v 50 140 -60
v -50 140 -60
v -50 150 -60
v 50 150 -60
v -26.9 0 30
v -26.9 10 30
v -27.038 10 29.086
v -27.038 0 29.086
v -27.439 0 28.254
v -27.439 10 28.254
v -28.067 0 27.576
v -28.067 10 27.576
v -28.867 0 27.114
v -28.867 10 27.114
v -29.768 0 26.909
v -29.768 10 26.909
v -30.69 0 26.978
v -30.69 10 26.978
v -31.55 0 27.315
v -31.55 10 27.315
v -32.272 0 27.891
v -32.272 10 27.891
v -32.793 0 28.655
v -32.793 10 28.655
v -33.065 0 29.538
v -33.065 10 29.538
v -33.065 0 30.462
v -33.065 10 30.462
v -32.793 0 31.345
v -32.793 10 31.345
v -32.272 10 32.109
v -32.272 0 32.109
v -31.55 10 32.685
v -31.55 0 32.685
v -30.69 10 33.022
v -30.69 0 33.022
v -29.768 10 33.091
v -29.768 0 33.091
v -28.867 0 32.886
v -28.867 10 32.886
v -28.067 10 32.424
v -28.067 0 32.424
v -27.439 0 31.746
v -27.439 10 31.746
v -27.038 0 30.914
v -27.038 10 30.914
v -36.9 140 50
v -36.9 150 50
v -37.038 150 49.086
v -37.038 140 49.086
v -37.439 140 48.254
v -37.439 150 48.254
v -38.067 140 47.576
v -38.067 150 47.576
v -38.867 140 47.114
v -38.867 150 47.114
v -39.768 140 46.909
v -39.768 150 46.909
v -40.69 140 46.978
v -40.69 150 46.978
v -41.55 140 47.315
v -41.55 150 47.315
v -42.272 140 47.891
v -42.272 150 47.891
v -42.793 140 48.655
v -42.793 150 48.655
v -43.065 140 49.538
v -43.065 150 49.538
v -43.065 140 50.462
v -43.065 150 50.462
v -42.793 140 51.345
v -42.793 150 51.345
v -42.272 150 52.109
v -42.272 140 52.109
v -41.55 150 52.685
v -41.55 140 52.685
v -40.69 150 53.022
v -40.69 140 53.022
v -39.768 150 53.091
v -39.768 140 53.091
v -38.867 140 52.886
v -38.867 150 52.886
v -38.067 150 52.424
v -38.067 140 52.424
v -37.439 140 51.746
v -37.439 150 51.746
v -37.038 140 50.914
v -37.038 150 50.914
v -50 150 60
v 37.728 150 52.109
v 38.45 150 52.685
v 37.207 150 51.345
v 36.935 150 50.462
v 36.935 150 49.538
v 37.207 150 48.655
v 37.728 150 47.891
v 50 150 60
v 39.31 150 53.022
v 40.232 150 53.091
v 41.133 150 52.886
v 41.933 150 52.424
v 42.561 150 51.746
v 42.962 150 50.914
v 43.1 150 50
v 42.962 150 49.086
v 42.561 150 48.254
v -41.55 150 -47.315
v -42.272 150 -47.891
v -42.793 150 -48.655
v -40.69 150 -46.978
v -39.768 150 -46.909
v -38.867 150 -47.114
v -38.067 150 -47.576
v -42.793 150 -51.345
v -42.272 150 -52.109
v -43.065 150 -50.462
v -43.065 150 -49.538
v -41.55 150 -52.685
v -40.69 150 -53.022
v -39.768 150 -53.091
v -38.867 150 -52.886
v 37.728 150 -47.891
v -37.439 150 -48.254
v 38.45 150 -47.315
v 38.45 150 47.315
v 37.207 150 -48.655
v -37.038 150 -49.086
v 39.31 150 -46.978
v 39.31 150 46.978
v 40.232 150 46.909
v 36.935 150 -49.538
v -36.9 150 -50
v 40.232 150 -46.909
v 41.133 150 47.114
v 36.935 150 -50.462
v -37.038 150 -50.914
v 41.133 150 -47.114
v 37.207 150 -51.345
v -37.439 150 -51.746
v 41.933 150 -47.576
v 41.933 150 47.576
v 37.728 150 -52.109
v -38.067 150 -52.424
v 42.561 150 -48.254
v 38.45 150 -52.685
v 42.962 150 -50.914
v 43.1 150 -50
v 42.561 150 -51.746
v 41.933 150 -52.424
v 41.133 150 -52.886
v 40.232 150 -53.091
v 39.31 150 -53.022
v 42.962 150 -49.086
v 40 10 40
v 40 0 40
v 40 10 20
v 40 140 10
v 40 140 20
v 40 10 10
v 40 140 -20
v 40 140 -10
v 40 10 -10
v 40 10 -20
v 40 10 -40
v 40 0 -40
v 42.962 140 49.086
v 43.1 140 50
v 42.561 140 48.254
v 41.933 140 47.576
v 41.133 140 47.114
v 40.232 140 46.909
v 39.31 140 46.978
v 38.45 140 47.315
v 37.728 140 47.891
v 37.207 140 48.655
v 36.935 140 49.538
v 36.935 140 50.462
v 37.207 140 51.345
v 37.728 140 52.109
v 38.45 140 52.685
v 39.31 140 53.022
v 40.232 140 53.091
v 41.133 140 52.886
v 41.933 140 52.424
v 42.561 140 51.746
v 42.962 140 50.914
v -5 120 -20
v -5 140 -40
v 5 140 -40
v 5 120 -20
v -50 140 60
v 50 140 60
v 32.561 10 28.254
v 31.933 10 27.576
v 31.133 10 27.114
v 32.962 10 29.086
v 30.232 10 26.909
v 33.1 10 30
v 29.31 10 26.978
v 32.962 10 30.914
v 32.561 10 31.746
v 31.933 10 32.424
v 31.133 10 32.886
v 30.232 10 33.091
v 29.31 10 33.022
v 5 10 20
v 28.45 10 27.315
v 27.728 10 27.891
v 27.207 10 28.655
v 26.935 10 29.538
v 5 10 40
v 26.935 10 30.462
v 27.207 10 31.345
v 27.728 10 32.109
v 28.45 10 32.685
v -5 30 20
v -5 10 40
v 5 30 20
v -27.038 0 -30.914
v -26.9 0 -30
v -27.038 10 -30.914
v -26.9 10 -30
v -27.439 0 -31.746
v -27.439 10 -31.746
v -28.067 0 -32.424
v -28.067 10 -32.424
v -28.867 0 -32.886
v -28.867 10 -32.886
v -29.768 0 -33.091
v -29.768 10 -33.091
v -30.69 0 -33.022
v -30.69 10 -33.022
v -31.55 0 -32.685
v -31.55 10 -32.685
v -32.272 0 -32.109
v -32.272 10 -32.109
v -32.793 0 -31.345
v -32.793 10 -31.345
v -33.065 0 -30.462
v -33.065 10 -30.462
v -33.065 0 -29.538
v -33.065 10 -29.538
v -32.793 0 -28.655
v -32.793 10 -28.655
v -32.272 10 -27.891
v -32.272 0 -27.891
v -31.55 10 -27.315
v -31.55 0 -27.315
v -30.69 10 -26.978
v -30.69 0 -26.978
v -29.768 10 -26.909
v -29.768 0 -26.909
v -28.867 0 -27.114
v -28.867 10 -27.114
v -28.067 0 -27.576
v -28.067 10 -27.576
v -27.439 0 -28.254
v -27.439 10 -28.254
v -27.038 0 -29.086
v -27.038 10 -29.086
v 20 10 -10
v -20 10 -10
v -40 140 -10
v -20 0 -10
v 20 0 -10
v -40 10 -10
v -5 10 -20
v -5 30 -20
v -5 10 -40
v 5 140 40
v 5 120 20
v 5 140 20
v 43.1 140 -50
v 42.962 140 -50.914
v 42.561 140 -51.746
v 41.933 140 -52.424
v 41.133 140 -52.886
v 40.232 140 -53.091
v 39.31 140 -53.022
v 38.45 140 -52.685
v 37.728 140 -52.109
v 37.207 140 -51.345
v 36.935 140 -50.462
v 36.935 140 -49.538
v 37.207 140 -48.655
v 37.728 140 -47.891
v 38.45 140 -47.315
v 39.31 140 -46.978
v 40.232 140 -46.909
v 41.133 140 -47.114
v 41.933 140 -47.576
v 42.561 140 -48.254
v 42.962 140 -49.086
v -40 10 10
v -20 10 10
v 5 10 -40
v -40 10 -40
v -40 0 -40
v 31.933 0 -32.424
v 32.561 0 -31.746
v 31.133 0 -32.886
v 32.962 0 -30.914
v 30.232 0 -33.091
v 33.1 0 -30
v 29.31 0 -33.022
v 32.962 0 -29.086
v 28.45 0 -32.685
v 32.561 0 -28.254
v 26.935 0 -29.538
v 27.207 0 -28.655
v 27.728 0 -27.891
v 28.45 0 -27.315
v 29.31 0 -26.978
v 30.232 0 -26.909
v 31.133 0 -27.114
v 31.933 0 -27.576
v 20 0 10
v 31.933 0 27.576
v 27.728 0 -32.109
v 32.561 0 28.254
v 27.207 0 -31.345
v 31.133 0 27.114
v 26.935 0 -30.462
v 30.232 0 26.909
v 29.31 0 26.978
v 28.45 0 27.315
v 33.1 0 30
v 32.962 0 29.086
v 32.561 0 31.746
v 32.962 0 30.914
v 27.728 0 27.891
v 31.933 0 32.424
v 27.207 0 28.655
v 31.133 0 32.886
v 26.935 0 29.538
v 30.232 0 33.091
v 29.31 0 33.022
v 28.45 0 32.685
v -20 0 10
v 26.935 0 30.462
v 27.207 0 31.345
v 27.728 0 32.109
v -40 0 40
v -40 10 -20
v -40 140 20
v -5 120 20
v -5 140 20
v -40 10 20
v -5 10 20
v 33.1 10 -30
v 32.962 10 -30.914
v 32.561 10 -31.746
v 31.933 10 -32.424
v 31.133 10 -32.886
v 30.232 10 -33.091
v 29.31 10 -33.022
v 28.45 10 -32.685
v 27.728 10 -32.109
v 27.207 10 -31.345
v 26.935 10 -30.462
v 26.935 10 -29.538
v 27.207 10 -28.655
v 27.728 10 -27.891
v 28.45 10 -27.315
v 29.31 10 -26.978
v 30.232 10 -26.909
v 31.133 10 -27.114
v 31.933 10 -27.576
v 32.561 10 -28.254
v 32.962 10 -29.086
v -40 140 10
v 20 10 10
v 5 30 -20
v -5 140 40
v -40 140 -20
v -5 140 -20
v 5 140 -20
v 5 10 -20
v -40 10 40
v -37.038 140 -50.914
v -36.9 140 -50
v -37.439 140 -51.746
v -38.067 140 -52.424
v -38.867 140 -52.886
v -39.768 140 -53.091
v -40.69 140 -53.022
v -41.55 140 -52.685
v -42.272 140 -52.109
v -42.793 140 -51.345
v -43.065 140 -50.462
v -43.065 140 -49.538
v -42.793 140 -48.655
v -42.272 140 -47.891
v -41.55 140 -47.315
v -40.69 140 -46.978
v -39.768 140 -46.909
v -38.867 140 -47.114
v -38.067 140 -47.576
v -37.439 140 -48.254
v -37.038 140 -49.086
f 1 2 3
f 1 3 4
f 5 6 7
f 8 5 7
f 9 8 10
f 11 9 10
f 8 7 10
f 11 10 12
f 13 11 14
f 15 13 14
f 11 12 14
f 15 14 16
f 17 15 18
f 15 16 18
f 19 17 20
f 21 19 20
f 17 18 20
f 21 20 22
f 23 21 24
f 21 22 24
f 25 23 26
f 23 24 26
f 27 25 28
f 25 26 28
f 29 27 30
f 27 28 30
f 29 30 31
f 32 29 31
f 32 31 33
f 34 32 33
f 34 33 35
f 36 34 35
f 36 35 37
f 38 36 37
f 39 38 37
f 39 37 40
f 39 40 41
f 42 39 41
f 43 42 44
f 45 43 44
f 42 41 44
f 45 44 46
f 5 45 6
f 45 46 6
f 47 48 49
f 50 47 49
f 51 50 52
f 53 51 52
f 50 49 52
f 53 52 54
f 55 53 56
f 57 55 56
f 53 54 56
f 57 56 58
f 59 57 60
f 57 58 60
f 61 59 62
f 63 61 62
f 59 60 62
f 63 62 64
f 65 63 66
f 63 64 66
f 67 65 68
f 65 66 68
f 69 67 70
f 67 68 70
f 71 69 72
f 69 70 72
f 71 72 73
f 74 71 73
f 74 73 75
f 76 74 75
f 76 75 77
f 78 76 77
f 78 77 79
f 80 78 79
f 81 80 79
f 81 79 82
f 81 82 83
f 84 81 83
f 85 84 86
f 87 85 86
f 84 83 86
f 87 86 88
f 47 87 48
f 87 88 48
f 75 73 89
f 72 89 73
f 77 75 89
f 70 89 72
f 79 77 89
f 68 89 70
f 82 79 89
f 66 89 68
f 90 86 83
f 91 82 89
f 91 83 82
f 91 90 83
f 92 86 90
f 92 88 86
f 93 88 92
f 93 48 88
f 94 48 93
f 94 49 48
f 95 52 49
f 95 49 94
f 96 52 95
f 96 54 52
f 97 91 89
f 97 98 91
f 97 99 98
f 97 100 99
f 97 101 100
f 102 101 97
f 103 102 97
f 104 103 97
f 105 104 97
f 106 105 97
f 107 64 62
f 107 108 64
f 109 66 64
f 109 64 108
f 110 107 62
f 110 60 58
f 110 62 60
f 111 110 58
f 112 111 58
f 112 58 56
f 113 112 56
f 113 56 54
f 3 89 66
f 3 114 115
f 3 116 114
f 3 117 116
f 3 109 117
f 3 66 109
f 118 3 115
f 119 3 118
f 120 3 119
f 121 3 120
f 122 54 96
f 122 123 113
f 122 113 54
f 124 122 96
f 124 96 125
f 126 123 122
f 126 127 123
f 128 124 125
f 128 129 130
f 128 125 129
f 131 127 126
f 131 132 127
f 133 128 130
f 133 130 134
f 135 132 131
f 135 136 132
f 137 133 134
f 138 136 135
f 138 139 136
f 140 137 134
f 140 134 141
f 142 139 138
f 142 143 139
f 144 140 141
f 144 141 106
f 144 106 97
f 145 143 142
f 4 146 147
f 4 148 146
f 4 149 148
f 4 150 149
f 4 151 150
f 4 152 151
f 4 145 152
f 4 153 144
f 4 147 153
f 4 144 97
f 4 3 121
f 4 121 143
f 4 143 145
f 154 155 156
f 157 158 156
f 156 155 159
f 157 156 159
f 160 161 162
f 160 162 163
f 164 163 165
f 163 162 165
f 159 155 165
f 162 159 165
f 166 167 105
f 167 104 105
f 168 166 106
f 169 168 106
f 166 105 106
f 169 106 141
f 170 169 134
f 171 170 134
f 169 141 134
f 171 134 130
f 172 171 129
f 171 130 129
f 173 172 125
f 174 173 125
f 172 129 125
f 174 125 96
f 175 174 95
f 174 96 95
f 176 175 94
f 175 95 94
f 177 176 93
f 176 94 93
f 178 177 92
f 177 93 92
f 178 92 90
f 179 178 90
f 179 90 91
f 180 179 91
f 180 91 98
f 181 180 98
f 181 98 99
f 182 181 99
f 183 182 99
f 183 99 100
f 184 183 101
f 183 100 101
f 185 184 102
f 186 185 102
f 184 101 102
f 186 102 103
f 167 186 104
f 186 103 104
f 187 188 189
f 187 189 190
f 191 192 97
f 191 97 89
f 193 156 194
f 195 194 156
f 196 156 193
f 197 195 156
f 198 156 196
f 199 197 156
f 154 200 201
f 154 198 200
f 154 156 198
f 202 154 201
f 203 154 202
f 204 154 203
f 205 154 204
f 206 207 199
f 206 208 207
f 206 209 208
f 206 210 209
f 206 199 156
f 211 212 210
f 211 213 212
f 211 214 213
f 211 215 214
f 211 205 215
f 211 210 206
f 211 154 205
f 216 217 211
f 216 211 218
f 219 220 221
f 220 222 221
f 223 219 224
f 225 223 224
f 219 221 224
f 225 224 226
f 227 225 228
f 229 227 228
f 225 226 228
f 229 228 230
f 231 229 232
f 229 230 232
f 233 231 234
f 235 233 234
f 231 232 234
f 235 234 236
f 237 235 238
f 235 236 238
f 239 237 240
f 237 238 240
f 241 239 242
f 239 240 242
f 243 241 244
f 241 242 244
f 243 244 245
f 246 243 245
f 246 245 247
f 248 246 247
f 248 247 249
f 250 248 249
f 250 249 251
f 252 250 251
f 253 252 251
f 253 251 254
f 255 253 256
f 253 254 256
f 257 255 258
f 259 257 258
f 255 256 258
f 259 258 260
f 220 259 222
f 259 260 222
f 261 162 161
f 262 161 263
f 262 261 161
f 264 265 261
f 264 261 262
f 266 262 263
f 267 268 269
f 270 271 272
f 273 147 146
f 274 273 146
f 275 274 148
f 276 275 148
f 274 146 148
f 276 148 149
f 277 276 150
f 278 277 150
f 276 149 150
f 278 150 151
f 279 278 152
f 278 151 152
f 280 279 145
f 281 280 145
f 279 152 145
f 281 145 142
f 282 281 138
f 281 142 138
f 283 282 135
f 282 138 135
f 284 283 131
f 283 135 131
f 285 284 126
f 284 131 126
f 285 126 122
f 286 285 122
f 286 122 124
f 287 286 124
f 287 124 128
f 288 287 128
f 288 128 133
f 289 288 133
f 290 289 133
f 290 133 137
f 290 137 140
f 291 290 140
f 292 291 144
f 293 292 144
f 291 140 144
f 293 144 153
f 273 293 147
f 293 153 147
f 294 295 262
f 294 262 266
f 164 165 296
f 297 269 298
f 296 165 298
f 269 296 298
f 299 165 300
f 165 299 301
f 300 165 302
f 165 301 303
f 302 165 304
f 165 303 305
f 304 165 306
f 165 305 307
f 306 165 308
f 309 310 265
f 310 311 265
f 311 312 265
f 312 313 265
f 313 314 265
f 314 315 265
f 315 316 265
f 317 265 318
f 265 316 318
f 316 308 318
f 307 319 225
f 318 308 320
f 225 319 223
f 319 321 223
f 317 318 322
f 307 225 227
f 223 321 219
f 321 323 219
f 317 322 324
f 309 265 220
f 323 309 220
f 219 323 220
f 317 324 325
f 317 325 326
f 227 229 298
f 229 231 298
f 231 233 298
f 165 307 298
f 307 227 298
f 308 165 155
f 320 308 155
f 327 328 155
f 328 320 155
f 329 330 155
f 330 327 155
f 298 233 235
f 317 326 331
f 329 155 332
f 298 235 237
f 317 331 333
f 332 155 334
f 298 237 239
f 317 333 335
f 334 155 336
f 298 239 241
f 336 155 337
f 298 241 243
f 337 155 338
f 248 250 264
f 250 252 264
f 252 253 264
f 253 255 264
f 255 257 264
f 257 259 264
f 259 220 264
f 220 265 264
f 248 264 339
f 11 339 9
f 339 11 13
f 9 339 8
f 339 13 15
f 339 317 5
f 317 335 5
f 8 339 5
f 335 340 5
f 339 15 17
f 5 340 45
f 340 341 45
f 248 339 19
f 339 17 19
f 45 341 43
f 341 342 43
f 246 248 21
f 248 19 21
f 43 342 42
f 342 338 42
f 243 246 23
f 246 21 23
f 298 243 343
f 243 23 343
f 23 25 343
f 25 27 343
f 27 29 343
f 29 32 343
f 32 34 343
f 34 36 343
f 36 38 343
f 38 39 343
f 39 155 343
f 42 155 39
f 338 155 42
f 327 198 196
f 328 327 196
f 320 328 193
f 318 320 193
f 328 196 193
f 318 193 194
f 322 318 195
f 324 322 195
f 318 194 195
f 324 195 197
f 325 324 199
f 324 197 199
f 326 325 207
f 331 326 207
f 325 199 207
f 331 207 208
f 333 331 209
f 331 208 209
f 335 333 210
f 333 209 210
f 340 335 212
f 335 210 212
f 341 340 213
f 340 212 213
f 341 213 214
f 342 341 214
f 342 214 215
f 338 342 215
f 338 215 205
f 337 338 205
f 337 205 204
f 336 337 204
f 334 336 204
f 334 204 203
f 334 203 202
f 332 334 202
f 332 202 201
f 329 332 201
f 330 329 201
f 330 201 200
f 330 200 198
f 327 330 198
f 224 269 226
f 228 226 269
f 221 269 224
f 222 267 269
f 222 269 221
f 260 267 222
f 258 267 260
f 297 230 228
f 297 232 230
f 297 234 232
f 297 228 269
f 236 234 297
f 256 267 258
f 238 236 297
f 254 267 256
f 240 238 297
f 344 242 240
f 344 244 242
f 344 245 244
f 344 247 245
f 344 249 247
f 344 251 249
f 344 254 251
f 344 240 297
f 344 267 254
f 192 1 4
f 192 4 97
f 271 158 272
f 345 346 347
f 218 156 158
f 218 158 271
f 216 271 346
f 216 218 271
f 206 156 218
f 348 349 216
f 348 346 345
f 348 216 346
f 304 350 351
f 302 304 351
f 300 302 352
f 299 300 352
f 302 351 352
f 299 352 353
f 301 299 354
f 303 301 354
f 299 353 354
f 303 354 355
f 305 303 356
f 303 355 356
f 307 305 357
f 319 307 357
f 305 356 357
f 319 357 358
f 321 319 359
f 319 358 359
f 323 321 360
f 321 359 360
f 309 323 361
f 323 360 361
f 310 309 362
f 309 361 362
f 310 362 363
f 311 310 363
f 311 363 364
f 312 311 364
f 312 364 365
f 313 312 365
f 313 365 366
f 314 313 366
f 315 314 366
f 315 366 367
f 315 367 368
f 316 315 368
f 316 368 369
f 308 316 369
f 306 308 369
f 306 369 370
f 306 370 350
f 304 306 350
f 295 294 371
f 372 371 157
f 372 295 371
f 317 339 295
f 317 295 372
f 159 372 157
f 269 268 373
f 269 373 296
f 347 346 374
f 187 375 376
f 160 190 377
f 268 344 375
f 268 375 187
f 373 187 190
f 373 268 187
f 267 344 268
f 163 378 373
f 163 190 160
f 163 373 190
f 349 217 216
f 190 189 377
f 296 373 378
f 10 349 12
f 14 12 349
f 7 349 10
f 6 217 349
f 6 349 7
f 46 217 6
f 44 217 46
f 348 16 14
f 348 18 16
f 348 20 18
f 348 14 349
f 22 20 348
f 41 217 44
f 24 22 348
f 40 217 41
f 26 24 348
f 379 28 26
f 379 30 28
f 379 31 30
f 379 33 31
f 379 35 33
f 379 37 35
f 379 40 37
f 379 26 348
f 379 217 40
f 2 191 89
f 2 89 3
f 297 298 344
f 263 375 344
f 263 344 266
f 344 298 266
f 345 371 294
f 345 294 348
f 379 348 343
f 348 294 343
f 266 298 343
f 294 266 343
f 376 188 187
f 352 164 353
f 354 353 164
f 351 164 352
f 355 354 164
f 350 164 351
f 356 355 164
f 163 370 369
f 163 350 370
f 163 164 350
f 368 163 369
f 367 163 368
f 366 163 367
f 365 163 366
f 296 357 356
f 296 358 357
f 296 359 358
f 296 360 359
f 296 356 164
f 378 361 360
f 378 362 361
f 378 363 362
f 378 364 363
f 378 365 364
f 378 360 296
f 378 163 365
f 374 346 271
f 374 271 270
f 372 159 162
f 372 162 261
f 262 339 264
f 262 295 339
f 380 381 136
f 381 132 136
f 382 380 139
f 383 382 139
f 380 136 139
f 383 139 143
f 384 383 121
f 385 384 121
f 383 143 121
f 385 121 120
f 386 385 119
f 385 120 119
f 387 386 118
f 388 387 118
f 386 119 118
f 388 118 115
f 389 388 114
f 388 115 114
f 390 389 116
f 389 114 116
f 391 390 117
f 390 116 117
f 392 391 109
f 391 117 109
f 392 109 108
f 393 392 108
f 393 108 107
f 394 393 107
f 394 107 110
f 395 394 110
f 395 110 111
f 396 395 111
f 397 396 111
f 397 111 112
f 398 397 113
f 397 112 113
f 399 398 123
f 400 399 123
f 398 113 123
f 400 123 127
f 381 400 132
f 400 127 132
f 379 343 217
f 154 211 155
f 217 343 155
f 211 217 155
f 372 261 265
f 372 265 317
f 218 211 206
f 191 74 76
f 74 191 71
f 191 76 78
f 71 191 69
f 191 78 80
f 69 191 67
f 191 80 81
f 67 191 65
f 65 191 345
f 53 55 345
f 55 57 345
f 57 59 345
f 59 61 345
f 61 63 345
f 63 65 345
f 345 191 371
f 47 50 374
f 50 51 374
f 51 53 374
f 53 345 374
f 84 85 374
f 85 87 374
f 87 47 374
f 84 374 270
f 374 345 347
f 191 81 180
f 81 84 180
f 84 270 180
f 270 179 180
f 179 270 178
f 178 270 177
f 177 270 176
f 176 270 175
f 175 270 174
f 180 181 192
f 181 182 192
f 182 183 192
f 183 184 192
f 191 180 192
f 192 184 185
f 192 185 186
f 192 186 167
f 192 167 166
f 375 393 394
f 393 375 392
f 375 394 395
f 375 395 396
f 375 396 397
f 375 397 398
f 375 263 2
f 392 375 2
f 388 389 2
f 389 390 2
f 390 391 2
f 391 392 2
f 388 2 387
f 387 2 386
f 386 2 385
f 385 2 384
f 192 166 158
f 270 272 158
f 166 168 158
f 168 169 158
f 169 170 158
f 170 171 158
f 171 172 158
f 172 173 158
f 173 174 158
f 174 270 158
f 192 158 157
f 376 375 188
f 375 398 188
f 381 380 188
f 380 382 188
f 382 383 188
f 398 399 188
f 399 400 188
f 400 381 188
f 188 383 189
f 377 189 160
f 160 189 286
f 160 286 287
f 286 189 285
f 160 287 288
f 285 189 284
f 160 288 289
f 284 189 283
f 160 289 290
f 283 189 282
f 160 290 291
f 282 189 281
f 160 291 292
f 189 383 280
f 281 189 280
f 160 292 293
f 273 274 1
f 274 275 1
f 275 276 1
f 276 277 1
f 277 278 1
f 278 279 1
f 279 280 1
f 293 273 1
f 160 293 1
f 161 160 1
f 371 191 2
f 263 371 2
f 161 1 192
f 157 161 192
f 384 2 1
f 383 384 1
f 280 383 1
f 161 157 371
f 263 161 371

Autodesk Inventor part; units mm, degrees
sketch "Sketch1" plane through (0, 0, 0) normal (0, 1, 0) x (-1, 0, 0)
  line L0 (40, 40) -> (-40, 40)
  line L1 (-40, 40) -> (-40, -40)
  line L2 (-40, -40) -> (40, -40)
  line L3 (40, -40) -> (40, 40)
  line L4 (40, 40) -> (-40, -40) construction
  line L5 (-40, 40) -> (40, -40) construction
  point P0 (0, 0)
  dimension "d0" = 80
  dimension "d1" = 80
extrude "Extrusion1" add sketch "Sketch1" along normal blind 10
sketch "Sketch2" plane through (0, 10, 0) normal (0, 1, 0) x (1, 0, 0)
  circle A0 centre (30, 30) radius 3.1
  circle A1 centre (30, -30) radius 3.1
  circle A2 centre (-30, -30) radius 3.1
  circle A3 centre (-30, 30) radius 3.1
  point P0 (0, 0)
  dimension "d4" = 6.2
  dimension "d5" = 6.2
  dimension "d6" = 6.2
  dimension "d7" = 6.2
  dimension "d8" = 30
  dimension "d9" = 30
  dimension "d10" = 30
  dimension "d11" = 30
  dimension "d12" = 30
  dimension "d13" = 30
  dimension "d14" = 30
  dimension "d15" = 30
extrude "Extrusion2" cut sketch "Sketch2" against normal blind 10
sketch "Sketch3" plane through (0, 10, 0) normal (0, 1, 0) x (1, 0, 0)
  line L0 (40, 10) -> (-40, 10)
  line L1 (-40, 10) -> (-40, 20)
  line L2 (-40, 20) -> (40, 20)
  line L3 (40, 20) -> (40, 10)
  line L4 (40, 10) -> (-40, 20) construction
  line L5 (-40, 10) -> (40, 20) construction
  line L6 (40, -20) -> (-40, -20)
  line L7 (-40, -20) -> (-40, -10)
  line L8 (-40, -10) -> (40, -10)
  line L9 (40, -10) -> (40, -20)
  line L10 (40, -20) -> (-40, -10) construction
  line L11 (-40, -20) -> (40, -10) construction
  line L12 (-40, 40) -> (-40, -40) projected
  line L13 (40, -40) -> (40, 40) projected
  line L14 (40, 40) -> (-40, 40) projected
  line L15 (-40, -40) -> (40, -40) projected
  point P0 (0, 0)
  point P1 (0, 15)
  point P2 (0, -15)
  dimension "d19" = 10
  dimension "d20" = 10
  dimension "d21" = 20
  dimension "d22" = 20
extrude "Extrusion3" add sketch "Sketch3" along normal blind 130 contours L0 L1 L2 L3 | L9 L6 L7 L8
sketch "Sketch4" plane through (0, 10, 0) normal (0, 1, 0) x (1, 0, 0)
  line L0 (20, -10) -> (-20, -10)
  line L1 (-20, -10) -> (-20, 10)
  line L2 (-20, 10) -> (20, 10)
  line L3 (20, 10) -> (20, -10)
  line L4 (20, -10) -> (-20, 10) construction
  line L5 (-20, -10) -> (20, 10) construction
  line L6 (-40, 10) -> (40, 10) projected
  point P0 (0, 0)
  dimension "d25" = 40
extrude "Extrusion4" cut sketch "Sketch4" against normal blind 10
sketch "Sketch5" plane through (0, 140, 0) normal (0, 1, 0) x (1, 0, 0)
  line L0 (50, -60) -> (-50, -60)
  line L1 (-50, -60) -> (-50, 60)
  line L2 (-50, 60) -> (50, 60)
  line L3 (50, 60) -> (50, -60)
  line L4 (50, -60) -> (-50, 60) construction
  line L5 (-50, -60) -> (50, 60) construction
  point P0 (0, 0)
  dimension "d28" = 100
  dimension "d29" = 120
extrude "Extrusion5" add sketch "Sketch5" along normal blind 10
sketch "Sketch6" plane through (0, 150, 0) normal (0, 1, 0) x (1, 0, 0)
  circle A0 centre (-40, 50) radius 3.1
  circle A1 centre (40, 50) radius 3.1
  circle A2 centre (40, -50) radius 3.1
  circle A3 centre (-40, -50) radius 3.1
  point P0 (0, 0)
  dimension "d32" = 6.2
  dimension "d33" = 6.2
  dimension "d34" = 6.2
  dimension "d35" = 6.2
  dimension "d36" = 50
  dimension "d37" = 50
  dimension "d38" = 50
  dimension "d39" = 50
  dimension "d40" = 40
  dimension "d41" = 40
  dimension "d42" = 40
  dimension "d43" = 40
extrude "Extrusion6" cut sketch "Sketch6" against normal blind 10
ref_plane "Work Plane1" through (0, 0, 40) normal (1, 0, 0) x (0, 0, -1)
sketch "Sketch7" plane through (0, 0, 40) normal (1, 0, 0) x (0, 0, -1)
  line L0 (80, 10) -> (60, 10)
  line L1 (60, 10) -> (60, 30)
  line L2 (60, 10) -> (80, 10) projected
  line L3 (60, 10) -> (60, 140) projected
  line L4 (60, 30) -> (80, 10)
  point P0 (40, 0)
  dimension "d47" = 20
  dimension "d48" = 20
extrude "Extrusion7" add sketch "Sketch7" along normal mid plane 10
ref_plane "Work Plane2" through (0, 75, 0) normal (0, -1, 0) x (1, 0, 0)
mirror "Mirror1" about plane through (0, 75, 0) normal (0, -1, 0) of "Extrusion7"
ref_plane "Work Plane3" through (40, 0, 0) normal (0, 0, -1) x (-1, 0, 0)
mirror "Mirror2" about plane through (40, 0, 0) normal (0, 0, -1) of "Extrusion7", "Mirror1"
properties part number "lidar" material "ABS Plastic"
